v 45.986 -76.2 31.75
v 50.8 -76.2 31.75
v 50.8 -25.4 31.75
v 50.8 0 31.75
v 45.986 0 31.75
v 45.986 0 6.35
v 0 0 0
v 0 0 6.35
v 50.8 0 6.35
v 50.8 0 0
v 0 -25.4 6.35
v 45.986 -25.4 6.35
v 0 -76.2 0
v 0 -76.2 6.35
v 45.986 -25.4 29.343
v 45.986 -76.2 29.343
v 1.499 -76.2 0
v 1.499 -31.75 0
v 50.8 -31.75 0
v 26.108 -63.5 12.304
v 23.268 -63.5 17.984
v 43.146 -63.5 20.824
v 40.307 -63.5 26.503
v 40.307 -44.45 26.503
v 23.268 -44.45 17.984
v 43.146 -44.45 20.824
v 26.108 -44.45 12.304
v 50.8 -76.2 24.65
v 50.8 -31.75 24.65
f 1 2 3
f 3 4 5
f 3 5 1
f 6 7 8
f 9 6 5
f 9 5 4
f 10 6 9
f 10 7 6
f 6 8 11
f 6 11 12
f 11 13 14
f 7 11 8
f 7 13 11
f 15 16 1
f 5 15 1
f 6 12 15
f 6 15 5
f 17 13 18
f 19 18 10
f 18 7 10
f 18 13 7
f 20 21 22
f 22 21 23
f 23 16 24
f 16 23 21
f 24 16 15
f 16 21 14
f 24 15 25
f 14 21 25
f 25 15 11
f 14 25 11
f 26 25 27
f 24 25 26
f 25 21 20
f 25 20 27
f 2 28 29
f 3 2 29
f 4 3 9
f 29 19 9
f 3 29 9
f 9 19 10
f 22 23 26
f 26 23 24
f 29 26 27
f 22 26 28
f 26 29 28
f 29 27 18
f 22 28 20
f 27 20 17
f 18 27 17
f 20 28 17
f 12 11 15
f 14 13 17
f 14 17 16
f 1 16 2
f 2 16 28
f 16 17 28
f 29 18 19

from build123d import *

# Parameters (mm, degrees)
SKETCH1_W           = 50.8
SKETCH1_H           = 76.2
BOSS_EXTRUDE1_DEPTH = 6.35
SKETCH2_W           = 50.8
SKETCH2_H           = 50.8
BOSS_EXTRUDE2_DEPTH = 25.4
CUT_EXTRUDE1_REACH  = 52.8
SKETCH4_W           = 4.813703211
SKETCH4_H           = 76.2
BOSS_EXTRUDE3_DEPTH = 31.75
CUT_EXTRUDE2_DEPTH  = 44.45
CUT_EXTRUDE3_REACH  = 30.398
SKETCH6_W           = 19.05
SKETCH6_H           = 19.05


with BuildPart() as part:
    # Sketch1 → Boss-Extrude1 (new body)
    with BuildSketch(Plane.XY):
        with Locations((25.4, -38.1)):
            Rectangle(SKETCH1_W, SKETCH1_H)
    extrude(amount=BOSS_EXTRUDE1_DEPTH)

    # Sketch2 → Boss-Extrude2 (add)
    with BuildSketch(Plane.XY.offset(6.35)):
        with Locations((25.4, -50.8)):
            Rectangle(SKETCH2_W, SKETCH2_H)
    extrude(amount=BOSS_EXTRUDE2_DEPTH)

    # Sketch3 → Cut-Extrude1 (cut, up to next)
    with BuildSketch(Plane(origin=(0, -25.4, 0), x_dir=(1, 0, 0), z_dir=(0, 1, 0)), mode=Mode.PRIVATE) as cut_extrude1_sk1:
        Polygon((0, -6.35), (0, -31.75), (50.8, -31.75), align=None)
    cut_extrude1_tool1 = extrude(cut_extrude1_sk1.sketch, amount=-CUT_EXTRUDE1_REACH, mode=Mode.PRIVATE) & part.part
    add(cut_extrude1_tool1.solids().sort_by_distance((16.933333, -25.4, 23.283333))[0], mode=Mode.SUBTRACT)

    # Sketch4 → Boss-Extrude3 (add)
    with BuildSketch(Plane(origin=(0, 0, 0), x_dir=(-1, 0, 0), z_dir=(0, 0, -1))):
        with Locations((-48.393148395, -38.1)):
            Rectangle(SKETCH4_W, SKETCH4_H)
    extrude(amount=-BOSS_EXTRUDE3_DEPTH)

    # Sketch5 → Cut-Extrude2 (cut)
    with BuildSketch(Plane.XZ.offset(76.2)):
        Polygon((50.8, 0), (50.8, 24.650484171), (1.499031657, 0), align=None)
    extrude(amount=-CUT_EXTRUDE2_DEPTH, mode=Mode.SUBTRACT)

    # Sketch6 → Cut-Extrude3 (cut, up to next)
    with BuildSketch(Plane(origin=(-2.54, 0, 5.08), x_dir=(0.894427191, 0, 0.447213595), z_dir=(-0.447213595, 0, 0.894427191)), mode=Mode.PRIVATE) as cut_extrude3_sk1:
        with Locations((38.379049159, -53.975)):
            Rectangle(SKETCH6_W, SKETCH6_H)
    cut_extrude3_tool1 = extrude(cut_extrude3_sk1.sketch, amount=-CUT_EXTRUDE3_REACH, mode=Mode.PRIVATE) & part.part
    add(cut_extrude3_tool1.solids().sort_by_distance((31.787265, -53.975, 22.243633))[0], mode=Mode.SUBTRACT)


solid = part.part
